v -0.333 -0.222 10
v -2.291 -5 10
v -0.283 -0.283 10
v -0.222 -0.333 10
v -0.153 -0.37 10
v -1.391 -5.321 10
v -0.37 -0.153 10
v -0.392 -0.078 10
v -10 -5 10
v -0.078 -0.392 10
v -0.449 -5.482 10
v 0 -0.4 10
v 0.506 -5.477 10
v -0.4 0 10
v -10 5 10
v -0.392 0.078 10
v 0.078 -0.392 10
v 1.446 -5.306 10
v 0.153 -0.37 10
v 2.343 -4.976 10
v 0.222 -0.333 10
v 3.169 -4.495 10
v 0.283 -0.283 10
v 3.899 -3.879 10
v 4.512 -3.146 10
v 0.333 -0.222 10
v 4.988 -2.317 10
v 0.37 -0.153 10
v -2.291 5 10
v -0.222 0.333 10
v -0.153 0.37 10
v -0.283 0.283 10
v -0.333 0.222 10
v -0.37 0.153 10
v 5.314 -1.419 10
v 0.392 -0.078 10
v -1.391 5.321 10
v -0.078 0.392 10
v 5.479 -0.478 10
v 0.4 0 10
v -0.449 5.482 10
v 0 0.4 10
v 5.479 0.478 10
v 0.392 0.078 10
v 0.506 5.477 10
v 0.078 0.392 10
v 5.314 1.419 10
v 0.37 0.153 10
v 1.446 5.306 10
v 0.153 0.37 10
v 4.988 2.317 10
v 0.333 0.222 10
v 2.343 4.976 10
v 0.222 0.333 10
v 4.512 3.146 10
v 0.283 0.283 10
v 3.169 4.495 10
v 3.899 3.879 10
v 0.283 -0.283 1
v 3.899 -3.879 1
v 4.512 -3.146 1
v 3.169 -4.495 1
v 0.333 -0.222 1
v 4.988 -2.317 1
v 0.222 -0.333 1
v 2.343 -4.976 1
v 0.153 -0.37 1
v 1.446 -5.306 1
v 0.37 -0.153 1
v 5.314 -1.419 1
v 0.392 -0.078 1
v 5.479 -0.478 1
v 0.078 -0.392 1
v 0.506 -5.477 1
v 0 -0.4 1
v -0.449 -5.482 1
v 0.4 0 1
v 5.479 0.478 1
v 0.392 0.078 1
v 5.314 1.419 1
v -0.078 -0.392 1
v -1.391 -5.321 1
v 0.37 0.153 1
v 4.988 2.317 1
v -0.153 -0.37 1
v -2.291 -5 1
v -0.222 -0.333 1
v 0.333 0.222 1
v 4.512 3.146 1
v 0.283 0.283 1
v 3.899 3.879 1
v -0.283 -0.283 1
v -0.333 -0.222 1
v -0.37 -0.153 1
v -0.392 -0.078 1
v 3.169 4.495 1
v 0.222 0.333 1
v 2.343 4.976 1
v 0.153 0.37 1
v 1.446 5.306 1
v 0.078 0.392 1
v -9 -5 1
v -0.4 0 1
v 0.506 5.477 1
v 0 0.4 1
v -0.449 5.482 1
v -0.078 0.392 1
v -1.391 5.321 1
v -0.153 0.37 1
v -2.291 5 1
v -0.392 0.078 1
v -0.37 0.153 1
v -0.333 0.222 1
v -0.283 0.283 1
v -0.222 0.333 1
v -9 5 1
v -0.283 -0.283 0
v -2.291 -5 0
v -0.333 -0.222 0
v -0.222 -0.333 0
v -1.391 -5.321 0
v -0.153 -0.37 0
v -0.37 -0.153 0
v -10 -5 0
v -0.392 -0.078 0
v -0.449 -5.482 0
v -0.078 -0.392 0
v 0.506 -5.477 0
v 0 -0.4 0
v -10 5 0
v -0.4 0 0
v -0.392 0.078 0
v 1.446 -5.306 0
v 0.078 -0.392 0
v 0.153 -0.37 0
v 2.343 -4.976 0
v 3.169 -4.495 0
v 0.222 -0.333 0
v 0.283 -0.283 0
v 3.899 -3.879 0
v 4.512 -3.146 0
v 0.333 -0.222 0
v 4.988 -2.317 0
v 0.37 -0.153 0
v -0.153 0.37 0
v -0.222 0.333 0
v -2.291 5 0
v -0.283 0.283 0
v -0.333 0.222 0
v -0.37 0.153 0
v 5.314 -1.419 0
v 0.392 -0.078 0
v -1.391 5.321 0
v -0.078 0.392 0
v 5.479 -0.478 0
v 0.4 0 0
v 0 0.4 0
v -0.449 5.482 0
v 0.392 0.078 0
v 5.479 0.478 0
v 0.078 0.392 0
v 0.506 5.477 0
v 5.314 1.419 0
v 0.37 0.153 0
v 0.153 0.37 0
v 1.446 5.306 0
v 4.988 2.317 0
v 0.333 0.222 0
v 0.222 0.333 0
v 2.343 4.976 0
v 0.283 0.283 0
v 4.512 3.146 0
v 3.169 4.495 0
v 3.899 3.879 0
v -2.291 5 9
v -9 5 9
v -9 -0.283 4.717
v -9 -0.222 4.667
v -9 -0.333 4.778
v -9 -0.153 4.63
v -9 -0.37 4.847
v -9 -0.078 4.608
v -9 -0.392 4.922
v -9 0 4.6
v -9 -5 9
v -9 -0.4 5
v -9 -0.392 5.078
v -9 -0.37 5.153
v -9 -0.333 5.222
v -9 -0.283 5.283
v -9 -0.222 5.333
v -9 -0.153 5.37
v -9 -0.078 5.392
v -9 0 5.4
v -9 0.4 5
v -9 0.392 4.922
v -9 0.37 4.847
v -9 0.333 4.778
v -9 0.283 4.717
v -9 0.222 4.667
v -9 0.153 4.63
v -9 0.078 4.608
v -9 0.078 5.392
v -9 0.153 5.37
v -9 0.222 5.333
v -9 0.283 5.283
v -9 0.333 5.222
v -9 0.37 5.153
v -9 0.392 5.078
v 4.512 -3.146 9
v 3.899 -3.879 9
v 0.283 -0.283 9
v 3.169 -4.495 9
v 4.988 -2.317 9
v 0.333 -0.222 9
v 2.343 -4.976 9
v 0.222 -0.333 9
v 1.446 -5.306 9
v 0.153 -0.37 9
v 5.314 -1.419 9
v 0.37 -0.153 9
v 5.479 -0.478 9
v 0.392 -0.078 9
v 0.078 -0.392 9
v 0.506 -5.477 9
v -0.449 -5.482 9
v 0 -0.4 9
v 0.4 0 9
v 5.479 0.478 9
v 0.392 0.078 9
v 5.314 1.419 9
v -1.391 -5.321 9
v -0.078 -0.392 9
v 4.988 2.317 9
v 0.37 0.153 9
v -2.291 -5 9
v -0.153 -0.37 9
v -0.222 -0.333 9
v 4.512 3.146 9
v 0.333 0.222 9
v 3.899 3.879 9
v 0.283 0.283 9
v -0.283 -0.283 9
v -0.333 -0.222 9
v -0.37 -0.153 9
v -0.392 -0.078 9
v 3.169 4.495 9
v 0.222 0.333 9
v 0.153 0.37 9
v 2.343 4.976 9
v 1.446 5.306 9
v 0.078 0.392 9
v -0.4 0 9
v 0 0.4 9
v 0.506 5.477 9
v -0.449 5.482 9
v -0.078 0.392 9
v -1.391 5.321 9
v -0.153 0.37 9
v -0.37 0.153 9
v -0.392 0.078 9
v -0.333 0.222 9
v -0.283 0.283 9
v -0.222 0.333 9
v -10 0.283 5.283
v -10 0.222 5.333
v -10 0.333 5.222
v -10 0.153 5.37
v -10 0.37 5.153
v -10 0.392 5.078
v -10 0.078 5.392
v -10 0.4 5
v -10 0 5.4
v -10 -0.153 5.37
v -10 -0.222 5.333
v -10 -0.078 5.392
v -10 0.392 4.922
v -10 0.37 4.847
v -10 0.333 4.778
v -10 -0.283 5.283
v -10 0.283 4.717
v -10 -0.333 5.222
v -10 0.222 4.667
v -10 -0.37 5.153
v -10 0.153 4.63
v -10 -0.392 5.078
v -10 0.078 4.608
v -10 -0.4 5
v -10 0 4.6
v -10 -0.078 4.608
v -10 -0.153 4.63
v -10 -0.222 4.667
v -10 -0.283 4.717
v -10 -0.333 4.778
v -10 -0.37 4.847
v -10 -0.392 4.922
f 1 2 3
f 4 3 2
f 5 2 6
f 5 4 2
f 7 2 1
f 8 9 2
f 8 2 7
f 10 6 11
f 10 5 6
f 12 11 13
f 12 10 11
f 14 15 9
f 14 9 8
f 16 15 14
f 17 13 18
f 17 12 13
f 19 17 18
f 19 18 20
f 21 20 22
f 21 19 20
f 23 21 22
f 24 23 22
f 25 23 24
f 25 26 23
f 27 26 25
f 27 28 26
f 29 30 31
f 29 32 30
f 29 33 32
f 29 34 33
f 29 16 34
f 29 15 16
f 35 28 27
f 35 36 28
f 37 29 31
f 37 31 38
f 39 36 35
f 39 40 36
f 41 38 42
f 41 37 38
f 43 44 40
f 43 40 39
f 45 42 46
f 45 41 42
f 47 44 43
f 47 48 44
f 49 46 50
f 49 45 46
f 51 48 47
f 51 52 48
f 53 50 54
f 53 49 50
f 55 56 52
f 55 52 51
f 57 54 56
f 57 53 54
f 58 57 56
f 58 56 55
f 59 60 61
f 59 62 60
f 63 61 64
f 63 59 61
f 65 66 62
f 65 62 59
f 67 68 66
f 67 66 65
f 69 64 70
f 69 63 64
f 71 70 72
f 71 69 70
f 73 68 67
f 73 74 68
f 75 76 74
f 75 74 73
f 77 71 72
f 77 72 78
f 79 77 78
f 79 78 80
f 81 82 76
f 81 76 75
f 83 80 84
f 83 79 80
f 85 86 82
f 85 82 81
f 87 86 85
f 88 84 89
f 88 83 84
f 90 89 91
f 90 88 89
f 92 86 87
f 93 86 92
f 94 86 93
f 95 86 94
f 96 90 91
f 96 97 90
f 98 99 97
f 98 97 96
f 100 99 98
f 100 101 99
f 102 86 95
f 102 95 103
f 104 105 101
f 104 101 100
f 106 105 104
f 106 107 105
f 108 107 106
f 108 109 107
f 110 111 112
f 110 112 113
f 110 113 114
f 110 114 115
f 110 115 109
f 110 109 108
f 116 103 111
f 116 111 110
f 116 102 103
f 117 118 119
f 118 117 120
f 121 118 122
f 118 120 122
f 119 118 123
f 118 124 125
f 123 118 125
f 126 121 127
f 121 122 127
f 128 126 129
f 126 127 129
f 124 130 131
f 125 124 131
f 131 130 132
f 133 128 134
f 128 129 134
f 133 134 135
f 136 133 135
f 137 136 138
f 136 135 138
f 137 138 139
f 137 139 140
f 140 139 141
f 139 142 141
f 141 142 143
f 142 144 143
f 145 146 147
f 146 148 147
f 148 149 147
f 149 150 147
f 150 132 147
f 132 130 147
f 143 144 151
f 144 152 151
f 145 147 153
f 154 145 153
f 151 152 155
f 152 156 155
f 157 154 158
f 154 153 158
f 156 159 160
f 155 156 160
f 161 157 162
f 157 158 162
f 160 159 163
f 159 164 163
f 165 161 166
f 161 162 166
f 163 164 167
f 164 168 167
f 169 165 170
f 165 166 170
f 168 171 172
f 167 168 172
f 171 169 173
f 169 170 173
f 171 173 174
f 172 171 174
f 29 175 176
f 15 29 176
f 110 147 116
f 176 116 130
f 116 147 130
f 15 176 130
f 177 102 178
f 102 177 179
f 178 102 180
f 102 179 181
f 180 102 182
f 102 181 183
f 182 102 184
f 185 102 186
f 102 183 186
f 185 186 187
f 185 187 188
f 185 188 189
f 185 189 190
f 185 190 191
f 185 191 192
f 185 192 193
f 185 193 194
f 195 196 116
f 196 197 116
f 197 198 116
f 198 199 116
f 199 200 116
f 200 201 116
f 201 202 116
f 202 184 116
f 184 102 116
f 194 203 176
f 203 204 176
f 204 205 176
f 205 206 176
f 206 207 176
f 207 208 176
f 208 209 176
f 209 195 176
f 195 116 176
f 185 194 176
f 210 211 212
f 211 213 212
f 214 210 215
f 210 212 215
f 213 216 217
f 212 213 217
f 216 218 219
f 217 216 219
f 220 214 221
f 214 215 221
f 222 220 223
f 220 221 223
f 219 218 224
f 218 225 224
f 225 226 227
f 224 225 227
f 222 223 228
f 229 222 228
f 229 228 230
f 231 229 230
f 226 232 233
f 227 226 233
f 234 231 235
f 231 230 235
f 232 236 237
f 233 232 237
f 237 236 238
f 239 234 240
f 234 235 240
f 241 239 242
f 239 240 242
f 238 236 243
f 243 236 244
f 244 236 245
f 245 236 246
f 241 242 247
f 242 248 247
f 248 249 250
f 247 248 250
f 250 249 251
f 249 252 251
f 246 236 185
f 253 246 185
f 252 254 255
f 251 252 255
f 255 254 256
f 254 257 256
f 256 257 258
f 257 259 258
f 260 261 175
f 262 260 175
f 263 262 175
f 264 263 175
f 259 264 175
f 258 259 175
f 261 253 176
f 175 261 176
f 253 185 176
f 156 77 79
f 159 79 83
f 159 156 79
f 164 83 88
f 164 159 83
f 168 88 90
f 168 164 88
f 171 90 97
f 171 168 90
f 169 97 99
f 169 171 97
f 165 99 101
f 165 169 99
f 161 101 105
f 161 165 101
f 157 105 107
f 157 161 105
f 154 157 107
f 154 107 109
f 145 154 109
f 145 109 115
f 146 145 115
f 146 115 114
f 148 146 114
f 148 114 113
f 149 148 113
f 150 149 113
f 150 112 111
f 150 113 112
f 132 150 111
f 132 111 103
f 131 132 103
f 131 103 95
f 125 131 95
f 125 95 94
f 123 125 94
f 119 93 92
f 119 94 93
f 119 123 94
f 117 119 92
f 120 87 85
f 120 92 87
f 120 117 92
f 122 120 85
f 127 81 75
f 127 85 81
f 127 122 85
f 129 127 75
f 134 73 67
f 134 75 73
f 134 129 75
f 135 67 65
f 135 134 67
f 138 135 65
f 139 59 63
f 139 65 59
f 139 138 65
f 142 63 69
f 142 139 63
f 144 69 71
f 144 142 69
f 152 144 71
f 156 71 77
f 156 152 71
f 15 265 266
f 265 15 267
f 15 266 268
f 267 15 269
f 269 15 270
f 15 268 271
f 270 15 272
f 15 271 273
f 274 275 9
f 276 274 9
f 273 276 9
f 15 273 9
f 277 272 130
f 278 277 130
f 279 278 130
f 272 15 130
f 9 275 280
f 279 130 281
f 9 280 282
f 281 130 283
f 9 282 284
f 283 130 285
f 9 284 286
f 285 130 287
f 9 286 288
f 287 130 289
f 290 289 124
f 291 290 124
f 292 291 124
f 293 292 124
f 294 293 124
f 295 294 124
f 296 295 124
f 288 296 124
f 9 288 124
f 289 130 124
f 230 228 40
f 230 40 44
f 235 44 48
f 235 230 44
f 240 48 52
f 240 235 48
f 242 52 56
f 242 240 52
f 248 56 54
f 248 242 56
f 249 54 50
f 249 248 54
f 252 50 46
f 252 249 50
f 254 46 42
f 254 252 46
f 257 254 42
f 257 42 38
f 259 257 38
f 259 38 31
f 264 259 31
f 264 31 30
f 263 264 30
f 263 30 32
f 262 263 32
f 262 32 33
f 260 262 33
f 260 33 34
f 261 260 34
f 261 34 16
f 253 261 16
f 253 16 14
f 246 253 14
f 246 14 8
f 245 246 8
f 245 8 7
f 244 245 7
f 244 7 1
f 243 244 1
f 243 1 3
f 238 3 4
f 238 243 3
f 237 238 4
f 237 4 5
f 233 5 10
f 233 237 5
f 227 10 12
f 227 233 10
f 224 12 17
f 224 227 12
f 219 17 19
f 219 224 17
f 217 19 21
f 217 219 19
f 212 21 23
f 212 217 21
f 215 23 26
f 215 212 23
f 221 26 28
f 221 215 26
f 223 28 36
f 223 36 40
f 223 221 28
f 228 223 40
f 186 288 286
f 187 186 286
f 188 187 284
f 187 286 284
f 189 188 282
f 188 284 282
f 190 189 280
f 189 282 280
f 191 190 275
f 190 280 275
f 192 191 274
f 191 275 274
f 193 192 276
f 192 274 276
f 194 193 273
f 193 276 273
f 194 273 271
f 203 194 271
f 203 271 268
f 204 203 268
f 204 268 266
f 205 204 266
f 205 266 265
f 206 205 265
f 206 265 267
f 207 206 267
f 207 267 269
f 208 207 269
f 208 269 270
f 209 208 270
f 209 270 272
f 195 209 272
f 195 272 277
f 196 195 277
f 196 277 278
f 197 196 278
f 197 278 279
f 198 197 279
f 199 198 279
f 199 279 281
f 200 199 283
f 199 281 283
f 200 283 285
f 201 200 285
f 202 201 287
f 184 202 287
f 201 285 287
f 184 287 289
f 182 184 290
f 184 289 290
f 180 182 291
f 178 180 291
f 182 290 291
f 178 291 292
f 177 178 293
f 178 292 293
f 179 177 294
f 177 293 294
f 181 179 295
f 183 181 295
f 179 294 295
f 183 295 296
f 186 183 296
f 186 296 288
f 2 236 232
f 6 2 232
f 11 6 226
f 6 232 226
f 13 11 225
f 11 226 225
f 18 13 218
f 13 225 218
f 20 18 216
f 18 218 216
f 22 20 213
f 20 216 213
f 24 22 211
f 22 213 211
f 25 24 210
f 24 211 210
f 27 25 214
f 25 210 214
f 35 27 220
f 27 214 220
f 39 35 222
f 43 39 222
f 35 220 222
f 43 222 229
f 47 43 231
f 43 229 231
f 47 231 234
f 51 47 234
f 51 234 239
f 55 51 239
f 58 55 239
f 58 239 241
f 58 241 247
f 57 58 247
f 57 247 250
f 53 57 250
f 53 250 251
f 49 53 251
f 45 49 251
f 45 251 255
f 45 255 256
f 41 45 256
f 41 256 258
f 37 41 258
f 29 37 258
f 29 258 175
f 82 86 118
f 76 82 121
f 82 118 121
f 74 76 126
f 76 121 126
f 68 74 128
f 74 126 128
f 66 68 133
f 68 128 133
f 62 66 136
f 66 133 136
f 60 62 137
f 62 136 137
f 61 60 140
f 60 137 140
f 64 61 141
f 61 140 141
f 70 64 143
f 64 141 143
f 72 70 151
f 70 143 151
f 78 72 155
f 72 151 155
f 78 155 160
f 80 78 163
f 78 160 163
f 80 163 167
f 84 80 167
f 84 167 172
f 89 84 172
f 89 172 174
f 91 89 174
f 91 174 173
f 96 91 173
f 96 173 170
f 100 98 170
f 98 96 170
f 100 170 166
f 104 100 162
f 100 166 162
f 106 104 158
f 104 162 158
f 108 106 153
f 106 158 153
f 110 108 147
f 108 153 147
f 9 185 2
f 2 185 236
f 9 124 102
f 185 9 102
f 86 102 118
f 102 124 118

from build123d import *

# Parameters (mm, degrees)
SKETCH1_R           = 0.4
BOSS_EXTRUDE1_DEPTH = 10
SKETCH2_W           = 8
SKETCH2_H           = 15
CUT_EXTRUDE2_DEPTH  = 19
SKETCH3_W           = 10
SKETCH3_H           = 10
BOSS_EXTRUDE2_DEPTH = 1
SKETCH4_R           = 0.4
CUT_EXTRUDE3_DEPTH  = 2


with BuildPart() as part:
    # Sketch1 → Boss-Extrude1 (new body)
    with BuildSketch(Plane.XY):
        with BuildLine():
            Line((-10, 5), (-10, -5))
            Line((-10, -5), (-2.291287847, -5))
            ThreePointArc((-2.291287847, -5), (5.5, 0), (-2.291287847, 5))
            Line((-2.291287847, 5), (-10, 5))
        make_face()
        Circle(SKETCH1_R, mode=Mode.SUBTRACT)
    extrude(amount=BOSS_EXTRUDE1_DEPTH)

    # Sketch2 → Cut-Extrude2 (cut)
    with BuildSketch(Plane.ZY.offset(10)):
        with Locations((5, 0)):
            Rectangle(SKETCH2_W, SKETCH2_H)
    extrude(amount=-CUT_EXTRUDE2_DEPTH, mode=Mode.SUBTRACT)


with BuildPart() as cut_extrude2_piece_1:
    # of the separate pieces the step leaves, piece 1, a body of its own (cut_extrude2_pieces)
    add(part.part.solids().sort_by_distance((-2.291287847, 5, 0))[0])



with BuildPart() as cut_extrude2_piece_2:
    # of the separate pieces the step leaves, piece 2, a body of its own (cut_extrude2_pieces)
    add(part.part.solids().sort_by_distance((-10, 5, 9))[0])


with BuildPart() as cut_extrude2_piece_1_1:
    add(cut_extrude2_piece_1.part)

    add(cut_extrude2_piece_2.part)  # Boss-Extrude2 merges Cut-Extrude2 piece 2
    # Sketch3 → Boss-Extrude2 (add)
    with BuildSketch(Plane.ZY.offset(10)):
        with Locations((5, 0)):
            Rectangle(SKETCH3_W, SKETCH3_H)
    extrude(amount=-BOSS_EXTRUDE2_DEPTH)

    # Sketch4 → Cut-Extrude3 (cut)
    with BuildSketch(Plane.ZY.offset(10)):
        with Locations(Location((5, 0, 0), (0, 0, 270))):
            Circle(SKETCH4_R)
    extrude(amount=-CUT_EXTRUDE3_DEPTH, mode=Mode.SUBTRACT)


solid = cut_extrude2_piece_1_1.part
